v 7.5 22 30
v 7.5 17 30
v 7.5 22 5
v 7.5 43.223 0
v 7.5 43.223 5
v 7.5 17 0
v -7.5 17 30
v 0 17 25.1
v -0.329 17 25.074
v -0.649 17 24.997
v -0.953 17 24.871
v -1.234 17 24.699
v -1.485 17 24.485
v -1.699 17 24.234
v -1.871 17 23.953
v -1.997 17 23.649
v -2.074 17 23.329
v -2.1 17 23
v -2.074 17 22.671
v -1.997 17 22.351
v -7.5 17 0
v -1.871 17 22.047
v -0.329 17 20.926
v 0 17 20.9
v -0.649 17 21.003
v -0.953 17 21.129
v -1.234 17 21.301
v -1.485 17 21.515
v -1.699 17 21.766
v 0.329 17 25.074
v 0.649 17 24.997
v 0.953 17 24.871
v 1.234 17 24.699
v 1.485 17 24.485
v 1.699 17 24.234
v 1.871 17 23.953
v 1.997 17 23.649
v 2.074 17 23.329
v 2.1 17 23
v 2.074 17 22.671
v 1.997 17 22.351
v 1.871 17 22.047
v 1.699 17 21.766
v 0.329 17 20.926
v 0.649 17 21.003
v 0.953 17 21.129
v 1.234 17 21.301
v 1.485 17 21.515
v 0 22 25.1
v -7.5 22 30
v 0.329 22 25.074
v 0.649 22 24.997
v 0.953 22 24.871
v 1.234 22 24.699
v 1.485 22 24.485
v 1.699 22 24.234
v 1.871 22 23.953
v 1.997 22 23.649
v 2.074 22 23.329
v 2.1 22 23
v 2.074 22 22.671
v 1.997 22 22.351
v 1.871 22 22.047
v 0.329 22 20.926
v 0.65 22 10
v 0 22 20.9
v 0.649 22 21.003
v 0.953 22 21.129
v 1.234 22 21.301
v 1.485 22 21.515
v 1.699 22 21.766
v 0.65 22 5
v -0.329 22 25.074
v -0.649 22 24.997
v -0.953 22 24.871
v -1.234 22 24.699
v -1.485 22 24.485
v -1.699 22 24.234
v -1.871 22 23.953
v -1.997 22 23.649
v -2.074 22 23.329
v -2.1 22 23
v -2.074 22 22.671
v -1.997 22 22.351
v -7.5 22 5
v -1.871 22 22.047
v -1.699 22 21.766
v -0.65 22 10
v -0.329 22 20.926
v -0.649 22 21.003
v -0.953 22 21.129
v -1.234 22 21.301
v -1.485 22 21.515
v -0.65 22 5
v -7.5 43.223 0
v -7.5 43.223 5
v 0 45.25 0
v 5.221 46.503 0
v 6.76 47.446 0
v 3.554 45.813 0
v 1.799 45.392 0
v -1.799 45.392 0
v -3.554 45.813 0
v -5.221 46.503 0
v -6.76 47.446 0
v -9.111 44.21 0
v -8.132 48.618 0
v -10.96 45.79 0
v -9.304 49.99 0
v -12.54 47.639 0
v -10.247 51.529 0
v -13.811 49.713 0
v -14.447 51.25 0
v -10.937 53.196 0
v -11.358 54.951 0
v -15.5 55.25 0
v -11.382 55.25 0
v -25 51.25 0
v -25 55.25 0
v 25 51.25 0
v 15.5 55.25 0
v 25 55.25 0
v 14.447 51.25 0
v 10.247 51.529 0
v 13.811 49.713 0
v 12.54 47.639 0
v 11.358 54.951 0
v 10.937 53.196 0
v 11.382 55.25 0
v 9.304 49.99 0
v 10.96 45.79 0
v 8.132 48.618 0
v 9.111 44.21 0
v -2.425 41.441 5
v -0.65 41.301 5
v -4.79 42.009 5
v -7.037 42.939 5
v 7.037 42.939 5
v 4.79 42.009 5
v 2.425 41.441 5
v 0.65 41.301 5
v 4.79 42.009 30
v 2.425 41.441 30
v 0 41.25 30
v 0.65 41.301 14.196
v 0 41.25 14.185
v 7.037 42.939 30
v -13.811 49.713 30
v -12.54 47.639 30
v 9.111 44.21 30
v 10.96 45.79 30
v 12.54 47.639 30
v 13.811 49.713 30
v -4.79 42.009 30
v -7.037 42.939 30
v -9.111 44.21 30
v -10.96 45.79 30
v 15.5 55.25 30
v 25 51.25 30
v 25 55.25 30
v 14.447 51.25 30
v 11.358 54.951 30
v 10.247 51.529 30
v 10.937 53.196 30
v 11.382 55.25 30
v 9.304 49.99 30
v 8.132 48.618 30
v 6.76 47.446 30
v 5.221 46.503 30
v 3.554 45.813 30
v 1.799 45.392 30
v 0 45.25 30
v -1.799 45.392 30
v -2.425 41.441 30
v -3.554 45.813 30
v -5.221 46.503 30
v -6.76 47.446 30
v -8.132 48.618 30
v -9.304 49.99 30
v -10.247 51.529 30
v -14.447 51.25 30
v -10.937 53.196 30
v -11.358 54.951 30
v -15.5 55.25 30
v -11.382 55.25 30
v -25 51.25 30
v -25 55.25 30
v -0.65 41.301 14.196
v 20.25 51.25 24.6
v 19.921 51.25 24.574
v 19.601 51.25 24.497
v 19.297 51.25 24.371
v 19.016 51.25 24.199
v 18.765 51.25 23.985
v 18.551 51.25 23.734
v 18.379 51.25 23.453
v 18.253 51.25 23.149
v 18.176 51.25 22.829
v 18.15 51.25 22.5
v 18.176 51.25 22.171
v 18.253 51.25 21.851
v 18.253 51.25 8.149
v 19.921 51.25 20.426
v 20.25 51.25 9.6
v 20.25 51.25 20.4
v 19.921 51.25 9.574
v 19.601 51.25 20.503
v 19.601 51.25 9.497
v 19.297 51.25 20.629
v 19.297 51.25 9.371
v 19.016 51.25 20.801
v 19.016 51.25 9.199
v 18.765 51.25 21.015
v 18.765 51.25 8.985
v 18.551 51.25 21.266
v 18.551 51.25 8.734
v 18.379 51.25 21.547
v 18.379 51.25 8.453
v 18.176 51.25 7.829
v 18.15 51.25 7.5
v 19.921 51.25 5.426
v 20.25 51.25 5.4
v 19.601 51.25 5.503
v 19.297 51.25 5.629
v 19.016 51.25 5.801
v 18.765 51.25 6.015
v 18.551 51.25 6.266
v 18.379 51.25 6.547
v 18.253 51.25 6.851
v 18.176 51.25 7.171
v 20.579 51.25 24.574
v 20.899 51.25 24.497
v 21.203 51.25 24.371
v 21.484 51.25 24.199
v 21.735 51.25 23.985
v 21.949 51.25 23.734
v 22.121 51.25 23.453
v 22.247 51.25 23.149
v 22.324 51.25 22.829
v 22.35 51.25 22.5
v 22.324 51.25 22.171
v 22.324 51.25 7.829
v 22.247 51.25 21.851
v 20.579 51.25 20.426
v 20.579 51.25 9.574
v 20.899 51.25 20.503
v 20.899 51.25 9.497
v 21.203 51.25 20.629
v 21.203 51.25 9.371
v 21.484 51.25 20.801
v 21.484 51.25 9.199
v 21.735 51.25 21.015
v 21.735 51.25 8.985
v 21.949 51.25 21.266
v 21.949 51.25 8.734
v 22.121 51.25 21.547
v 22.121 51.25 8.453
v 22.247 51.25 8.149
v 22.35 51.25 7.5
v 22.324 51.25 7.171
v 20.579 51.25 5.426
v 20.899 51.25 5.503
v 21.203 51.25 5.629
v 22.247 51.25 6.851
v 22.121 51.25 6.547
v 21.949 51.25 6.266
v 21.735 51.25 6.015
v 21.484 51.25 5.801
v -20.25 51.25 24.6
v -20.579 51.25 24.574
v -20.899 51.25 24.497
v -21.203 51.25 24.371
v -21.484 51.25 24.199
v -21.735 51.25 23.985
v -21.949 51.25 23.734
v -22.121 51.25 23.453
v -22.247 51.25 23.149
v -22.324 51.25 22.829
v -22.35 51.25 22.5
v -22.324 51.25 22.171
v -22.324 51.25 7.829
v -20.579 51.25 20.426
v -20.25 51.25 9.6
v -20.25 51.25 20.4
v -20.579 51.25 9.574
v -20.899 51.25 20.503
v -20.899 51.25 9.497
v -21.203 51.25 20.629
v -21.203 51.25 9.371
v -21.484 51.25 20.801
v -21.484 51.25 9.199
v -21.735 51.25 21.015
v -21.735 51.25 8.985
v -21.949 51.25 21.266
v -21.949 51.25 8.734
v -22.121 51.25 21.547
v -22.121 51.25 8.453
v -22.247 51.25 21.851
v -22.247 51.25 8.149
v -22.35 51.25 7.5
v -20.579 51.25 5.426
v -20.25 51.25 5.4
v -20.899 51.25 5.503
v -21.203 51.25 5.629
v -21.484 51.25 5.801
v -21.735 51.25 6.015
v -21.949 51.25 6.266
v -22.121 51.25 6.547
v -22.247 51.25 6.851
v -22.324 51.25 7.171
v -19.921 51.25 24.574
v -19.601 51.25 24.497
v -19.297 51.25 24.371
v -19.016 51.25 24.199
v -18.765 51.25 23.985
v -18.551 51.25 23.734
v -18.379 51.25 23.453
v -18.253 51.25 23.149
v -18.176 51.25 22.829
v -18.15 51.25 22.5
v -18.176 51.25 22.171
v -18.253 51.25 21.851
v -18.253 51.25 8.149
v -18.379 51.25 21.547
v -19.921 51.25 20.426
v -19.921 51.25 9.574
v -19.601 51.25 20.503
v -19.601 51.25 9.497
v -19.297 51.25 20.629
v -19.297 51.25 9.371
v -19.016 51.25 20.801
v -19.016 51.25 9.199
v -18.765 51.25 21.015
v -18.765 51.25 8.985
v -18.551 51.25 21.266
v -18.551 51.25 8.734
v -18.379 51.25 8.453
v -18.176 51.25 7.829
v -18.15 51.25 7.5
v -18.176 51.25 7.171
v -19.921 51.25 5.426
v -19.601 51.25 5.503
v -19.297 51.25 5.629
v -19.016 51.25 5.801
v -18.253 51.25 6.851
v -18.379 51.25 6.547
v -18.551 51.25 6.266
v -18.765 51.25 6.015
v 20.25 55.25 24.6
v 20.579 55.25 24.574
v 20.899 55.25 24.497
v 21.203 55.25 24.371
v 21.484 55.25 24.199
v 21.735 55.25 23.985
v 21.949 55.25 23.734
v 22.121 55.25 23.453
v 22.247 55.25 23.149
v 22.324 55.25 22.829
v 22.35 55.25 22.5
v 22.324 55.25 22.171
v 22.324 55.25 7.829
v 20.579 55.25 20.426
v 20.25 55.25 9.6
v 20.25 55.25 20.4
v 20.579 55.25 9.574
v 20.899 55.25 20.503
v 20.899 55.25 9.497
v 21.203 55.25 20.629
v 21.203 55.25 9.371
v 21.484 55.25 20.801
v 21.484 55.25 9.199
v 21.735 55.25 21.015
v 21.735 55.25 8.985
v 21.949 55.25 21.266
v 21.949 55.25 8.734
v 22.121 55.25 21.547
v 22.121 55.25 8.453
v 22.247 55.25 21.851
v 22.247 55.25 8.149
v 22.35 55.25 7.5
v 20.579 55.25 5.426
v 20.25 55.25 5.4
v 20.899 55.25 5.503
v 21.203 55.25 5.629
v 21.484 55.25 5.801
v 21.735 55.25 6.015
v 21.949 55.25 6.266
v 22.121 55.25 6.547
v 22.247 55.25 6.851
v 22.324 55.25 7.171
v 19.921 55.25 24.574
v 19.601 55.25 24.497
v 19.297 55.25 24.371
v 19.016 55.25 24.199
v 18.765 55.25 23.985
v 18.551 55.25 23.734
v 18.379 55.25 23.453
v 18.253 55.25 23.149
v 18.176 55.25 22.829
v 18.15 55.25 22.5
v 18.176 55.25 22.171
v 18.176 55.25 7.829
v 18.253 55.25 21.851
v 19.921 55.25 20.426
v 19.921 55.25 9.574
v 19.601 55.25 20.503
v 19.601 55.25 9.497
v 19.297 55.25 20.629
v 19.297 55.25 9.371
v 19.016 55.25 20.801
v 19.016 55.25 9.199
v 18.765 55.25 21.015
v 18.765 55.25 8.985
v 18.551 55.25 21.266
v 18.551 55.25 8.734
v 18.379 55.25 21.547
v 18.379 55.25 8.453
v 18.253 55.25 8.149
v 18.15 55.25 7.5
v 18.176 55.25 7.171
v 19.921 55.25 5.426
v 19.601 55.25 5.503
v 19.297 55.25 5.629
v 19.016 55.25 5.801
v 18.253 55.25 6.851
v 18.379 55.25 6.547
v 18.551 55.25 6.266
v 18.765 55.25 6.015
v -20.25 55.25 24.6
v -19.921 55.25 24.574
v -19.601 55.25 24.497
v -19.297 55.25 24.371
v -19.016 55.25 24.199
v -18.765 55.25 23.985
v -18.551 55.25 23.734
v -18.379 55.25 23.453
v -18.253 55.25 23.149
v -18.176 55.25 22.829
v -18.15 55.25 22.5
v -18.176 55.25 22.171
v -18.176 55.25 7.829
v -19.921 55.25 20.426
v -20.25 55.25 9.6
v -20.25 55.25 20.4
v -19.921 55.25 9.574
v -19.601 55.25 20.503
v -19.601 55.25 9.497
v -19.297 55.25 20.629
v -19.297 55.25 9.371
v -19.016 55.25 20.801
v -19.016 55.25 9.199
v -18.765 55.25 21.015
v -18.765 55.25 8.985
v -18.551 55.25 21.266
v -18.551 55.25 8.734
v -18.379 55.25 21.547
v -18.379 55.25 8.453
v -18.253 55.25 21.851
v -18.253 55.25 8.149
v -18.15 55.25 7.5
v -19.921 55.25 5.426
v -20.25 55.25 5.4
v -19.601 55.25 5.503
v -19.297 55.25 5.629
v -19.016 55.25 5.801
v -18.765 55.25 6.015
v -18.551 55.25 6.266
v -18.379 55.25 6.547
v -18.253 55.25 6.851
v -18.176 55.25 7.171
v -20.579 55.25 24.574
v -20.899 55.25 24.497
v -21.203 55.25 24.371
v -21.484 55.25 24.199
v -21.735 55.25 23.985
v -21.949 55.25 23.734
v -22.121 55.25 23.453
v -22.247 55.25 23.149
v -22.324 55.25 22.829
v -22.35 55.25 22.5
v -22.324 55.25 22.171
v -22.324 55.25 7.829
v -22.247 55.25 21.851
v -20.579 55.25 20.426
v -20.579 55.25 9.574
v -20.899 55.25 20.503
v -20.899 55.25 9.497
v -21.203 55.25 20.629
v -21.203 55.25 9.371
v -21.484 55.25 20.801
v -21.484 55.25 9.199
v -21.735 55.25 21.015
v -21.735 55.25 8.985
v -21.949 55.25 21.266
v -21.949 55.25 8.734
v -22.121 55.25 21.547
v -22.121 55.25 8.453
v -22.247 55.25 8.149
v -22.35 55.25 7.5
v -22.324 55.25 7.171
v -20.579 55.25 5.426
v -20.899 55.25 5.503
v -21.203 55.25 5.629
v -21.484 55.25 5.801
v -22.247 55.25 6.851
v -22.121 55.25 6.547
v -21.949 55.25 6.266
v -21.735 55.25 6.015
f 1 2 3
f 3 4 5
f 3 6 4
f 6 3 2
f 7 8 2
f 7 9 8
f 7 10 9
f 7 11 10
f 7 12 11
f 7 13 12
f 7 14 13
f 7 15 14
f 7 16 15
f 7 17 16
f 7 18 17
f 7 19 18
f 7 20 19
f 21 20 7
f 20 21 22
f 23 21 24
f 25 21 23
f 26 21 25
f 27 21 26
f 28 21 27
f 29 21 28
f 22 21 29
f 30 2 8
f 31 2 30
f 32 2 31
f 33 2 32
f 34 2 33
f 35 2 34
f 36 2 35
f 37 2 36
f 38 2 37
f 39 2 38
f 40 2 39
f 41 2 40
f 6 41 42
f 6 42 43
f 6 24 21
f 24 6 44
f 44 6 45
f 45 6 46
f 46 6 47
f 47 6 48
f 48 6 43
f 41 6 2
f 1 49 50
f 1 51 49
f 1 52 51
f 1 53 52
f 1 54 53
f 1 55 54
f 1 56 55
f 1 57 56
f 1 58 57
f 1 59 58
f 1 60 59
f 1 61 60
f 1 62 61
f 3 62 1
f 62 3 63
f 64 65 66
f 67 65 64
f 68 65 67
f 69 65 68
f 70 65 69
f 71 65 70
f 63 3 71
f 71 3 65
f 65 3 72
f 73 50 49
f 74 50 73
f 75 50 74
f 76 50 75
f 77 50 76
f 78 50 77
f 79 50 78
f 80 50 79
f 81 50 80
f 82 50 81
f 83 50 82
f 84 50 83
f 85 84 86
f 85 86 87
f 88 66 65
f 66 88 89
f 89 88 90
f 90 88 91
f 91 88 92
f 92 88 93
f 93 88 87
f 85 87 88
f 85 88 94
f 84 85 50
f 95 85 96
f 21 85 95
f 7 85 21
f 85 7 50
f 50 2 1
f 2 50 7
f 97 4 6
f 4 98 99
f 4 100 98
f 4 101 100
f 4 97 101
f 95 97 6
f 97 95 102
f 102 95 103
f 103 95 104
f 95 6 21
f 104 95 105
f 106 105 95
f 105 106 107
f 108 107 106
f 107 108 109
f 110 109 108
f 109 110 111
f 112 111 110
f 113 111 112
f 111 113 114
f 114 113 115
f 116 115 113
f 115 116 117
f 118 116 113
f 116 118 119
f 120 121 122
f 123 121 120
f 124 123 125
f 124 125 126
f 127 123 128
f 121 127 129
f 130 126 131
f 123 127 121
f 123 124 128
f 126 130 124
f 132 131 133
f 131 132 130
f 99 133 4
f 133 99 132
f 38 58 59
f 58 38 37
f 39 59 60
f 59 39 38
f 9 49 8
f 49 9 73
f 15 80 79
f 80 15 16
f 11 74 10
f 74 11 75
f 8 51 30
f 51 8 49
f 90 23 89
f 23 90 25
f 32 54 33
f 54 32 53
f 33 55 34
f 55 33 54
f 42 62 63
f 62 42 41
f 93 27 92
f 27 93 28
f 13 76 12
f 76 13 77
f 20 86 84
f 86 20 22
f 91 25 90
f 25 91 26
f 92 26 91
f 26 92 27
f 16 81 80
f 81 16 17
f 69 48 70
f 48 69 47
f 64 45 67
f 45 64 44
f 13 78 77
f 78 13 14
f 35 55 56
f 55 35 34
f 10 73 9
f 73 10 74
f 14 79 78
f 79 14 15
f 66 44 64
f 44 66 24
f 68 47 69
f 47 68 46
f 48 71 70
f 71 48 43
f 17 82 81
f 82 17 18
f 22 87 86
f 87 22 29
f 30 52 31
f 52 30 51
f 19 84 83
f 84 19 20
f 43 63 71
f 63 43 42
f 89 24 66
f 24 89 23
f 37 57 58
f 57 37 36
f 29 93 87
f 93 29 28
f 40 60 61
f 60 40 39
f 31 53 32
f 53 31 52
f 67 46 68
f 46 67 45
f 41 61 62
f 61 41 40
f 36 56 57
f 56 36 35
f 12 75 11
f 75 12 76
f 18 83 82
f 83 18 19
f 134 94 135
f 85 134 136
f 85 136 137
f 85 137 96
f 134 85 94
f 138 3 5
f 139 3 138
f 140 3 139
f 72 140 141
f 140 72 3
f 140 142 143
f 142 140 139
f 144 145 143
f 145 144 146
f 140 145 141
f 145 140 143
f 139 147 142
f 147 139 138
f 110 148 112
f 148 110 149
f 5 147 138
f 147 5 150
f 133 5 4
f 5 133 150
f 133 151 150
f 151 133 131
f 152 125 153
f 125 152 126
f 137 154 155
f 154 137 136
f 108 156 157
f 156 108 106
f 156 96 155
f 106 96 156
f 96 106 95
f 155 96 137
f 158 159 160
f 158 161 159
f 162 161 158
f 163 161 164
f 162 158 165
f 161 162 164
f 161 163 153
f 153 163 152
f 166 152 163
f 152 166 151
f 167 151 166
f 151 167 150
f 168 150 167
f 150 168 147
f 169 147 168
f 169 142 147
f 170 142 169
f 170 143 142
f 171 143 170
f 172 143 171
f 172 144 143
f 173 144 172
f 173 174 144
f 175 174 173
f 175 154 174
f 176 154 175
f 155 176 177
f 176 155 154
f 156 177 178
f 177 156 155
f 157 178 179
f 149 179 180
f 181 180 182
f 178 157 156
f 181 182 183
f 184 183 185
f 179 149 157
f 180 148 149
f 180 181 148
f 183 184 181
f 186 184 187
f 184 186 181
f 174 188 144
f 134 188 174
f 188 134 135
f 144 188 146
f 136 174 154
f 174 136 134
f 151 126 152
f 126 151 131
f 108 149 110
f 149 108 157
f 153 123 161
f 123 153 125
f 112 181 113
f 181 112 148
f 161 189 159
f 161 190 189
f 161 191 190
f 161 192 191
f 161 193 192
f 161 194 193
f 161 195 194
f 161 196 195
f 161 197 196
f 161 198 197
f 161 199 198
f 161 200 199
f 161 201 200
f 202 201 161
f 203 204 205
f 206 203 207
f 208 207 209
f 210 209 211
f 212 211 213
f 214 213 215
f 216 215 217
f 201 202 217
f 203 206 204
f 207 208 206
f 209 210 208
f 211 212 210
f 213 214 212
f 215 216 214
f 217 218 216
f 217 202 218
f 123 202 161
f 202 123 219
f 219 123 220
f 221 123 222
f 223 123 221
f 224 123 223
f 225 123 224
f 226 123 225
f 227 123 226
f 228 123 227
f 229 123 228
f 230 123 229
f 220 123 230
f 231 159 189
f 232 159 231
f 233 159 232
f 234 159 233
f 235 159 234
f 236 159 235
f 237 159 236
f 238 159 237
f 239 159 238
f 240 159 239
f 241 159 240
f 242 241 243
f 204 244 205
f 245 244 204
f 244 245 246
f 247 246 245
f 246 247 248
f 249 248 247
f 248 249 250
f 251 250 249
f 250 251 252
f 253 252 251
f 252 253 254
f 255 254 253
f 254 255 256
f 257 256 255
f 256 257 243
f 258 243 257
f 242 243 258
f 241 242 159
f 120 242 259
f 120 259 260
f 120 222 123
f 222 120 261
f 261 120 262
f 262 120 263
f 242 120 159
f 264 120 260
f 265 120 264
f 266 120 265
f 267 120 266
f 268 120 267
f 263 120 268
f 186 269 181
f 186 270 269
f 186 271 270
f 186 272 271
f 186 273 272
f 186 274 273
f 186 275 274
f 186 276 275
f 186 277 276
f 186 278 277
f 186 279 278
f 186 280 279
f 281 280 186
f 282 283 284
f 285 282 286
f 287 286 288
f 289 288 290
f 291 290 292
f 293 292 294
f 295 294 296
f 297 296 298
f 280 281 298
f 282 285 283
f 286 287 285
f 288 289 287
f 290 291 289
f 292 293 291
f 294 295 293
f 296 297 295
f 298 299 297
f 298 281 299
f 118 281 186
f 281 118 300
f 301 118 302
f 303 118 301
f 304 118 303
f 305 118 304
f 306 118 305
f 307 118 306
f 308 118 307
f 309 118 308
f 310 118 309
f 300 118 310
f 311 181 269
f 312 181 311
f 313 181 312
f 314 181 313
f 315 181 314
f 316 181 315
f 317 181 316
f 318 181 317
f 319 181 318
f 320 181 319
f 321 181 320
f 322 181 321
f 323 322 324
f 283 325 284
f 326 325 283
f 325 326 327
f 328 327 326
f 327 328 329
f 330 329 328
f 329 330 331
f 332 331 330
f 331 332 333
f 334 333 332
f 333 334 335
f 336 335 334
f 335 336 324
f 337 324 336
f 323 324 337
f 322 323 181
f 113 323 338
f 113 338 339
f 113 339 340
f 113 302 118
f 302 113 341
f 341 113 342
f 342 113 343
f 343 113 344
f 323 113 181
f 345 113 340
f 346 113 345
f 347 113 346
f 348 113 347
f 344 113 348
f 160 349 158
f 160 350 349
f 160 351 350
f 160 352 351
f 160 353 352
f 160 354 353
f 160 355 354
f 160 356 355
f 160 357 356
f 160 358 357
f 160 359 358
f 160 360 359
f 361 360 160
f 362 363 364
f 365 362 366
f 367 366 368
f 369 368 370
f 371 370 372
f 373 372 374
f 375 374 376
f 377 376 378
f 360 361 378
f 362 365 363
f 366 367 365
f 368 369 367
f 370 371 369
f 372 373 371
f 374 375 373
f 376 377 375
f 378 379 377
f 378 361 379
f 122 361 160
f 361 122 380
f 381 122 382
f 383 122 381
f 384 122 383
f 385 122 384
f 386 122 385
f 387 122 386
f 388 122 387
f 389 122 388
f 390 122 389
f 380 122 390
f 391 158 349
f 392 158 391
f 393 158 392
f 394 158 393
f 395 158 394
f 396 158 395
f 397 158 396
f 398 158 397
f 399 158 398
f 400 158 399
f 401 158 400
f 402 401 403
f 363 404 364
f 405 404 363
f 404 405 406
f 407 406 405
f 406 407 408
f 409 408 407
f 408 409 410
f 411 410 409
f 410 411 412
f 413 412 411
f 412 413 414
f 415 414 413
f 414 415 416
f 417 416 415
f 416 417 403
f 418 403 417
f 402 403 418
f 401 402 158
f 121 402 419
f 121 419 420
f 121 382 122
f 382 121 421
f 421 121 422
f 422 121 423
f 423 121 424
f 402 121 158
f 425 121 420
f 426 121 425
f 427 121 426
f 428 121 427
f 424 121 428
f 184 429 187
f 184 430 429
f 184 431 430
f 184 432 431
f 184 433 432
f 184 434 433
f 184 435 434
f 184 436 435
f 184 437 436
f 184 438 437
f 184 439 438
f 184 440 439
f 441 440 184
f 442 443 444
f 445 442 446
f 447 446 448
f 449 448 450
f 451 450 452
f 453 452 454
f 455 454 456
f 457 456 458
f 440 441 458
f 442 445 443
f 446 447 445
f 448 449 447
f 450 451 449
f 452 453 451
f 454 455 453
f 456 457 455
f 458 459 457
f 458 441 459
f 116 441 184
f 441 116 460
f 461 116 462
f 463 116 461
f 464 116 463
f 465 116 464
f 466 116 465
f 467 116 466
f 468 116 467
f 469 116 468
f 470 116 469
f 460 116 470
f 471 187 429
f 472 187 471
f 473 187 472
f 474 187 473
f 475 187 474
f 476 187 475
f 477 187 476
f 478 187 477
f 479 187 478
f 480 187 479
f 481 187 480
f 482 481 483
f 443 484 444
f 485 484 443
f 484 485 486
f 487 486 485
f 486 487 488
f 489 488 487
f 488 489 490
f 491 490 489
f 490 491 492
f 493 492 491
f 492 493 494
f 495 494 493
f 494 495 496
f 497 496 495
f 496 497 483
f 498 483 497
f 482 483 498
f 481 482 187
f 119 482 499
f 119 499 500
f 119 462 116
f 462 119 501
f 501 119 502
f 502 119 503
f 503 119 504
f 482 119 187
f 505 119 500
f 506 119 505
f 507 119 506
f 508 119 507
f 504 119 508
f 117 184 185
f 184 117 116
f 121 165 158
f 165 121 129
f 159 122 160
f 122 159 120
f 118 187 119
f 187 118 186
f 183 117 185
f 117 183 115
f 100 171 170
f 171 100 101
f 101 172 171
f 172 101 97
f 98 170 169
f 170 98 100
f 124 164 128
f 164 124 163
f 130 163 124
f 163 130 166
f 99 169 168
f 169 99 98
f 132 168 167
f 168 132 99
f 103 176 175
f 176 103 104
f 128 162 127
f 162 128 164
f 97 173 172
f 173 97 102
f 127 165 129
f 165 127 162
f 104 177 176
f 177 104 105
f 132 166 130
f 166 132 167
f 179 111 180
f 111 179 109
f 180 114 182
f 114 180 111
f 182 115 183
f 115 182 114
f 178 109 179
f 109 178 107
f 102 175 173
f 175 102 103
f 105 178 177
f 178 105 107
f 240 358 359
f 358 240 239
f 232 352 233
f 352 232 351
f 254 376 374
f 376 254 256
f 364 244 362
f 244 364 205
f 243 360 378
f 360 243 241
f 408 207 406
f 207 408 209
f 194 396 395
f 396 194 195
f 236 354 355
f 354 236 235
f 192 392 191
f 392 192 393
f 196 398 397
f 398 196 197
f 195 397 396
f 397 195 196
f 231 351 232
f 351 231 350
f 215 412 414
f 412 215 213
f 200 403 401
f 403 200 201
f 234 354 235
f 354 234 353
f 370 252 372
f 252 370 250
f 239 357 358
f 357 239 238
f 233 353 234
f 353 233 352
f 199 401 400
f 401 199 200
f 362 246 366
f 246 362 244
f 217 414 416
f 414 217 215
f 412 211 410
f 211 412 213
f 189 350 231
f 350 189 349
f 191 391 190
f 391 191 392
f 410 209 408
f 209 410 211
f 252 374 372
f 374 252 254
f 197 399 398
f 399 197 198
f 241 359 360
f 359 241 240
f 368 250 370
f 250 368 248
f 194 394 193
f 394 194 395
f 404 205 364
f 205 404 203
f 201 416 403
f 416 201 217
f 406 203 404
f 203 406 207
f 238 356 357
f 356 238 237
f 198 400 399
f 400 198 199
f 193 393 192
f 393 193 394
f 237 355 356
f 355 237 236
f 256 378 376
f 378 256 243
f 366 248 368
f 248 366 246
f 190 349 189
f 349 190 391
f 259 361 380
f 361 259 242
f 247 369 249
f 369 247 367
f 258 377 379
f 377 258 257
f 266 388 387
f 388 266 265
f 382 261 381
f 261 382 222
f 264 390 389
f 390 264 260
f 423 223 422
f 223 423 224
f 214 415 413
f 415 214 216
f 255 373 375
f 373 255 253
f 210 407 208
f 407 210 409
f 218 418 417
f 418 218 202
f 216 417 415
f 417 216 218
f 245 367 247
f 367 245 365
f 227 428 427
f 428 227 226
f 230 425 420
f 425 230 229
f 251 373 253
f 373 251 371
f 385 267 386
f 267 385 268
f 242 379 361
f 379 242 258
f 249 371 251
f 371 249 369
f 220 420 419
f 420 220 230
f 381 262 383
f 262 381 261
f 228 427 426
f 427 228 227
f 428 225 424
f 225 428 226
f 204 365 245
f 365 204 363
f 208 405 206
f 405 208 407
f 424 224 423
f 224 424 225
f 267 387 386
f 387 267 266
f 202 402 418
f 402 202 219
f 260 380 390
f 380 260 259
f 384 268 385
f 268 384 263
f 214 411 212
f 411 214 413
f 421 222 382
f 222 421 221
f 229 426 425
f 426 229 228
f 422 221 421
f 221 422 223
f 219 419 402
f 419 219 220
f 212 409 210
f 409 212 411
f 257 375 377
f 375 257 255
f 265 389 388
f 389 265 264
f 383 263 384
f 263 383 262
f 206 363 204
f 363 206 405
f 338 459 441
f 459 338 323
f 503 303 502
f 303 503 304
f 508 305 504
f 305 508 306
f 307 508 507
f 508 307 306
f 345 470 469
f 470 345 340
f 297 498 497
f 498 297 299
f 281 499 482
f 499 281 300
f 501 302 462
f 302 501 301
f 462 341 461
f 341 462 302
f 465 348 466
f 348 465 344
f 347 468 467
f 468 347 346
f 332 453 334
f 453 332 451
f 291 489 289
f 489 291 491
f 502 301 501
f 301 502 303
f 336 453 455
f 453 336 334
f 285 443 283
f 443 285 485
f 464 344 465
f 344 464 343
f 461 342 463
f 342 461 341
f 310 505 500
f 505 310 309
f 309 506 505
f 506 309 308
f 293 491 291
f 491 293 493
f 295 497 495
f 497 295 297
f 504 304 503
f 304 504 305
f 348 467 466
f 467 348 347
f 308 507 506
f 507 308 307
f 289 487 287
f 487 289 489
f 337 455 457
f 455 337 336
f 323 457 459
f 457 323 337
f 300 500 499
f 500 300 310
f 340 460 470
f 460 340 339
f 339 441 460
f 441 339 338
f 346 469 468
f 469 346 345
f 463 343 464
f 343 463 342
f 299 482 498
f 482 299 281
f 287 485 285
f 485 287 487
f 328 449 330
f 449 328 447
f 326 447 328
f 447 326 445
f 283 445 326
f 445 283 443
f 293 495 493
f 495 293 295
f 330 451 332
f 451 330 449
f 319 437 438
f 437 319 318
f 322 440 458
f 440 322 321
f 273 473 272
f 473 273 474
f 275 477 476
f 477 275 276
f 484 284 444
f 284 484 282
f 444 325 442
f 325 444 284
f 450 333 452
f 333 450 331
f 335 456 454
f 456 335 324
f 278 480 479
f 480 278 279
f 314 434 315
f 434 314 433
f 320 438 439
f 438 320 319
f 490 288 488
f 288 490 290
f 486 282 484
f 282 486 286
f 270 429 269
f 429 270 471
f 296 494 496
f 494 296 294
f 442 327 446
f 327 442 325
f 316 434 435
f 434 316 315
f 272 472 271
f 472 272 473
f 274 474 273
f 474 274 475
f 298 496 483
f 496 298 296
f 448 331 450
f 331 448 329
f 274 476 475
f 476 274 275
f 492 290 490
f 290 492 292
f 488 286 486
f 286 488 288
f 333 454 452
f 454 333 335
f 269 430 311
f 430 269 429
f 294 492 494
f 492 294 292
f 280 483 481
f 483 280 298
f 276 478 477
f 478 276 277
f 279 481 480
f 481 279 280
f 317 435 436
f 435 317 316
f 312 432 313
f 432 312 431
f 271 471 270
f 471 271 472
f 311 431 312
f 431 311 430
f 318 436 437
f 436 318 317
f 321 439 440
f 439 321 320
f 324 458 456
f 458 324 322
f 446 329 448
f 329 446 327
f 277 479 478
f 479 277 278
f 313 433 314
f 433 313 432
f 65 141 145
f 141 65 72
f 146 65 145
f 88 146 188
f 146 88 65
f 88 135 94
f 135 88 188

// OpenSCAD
// file: ISLHOLDER01A_D04.scad
$fn=40; // model faces resolution.
include <../configuration2.scad>


//Drzak na sloup - cast bez drzaku anemometru
module ISLHOLDER01A_D04(){
	
difference()
    {
    union()
        {
        //základní válec
        cylinder(h=D02_vyska_uchytky,r=(D02_prumer_obruby+2*D02_sila_materialu)/2,center=true);
		//úchytové plošky		
        translate([D02_dotahova_vzdalenost+D02_sila_materialu/2,0,0]){cube([D02_sila_materialu,D02_delka_celeho_uchytu,D02_vyska_uchytky],center=true);}
		}
    
    //válec na odečet
    cylinder(h=D02_vyska_uchytky+0.01,r=D02_prumer_obruby/2,center=true);     
	        
    //kvádr na odecet
	translate([D02_dotahova_vzdalenost-(D02_prumer_obruby+2*D02_sila_materialu)/2,0,0]){cube([D02_prumer_obruby+2*D02_sila_materialu,D02_prumer_obruby+2*D02_sila_materialu,D02_vyska_uchytky+0.01],center=true);}
		
	//otvory na sroub
	translate([D02_dotahova_vzdalenost,(D02_delka_celeho_uchytu/2-D02_prumer_obruby/2-D02_sila_materialu)/2+D02_prumer_obruby/2+D02_sila_materialu,D02_vyska_uchytky/4]){rotate([0,90,0]){cylinder(h=D02_sila_materialu+0.01,r=D02_prumer_uchytneho_sroubu/2);}}
    
     //drzak matky
    translate([D02_dotahova_vzdalenost+D02_sila_materialu-D02_vyska_matky,(D02_delka_celeho_uchytu/2-D02_prumer_obruby/2-D02_sila_materialu)/2+D02_prumer_obruby/2+D02_sila_materialu,D02_vyska_uchytky/4]){rotate([0,90,0]){ cylinder (h = D02_vyska_matky+0.01, r= (D02_sirka_matky+0.2)/2, $fn=6);}}
   
     
        
    translate([D02_dotahova_vzdalenost,(D02_delka_celeho_uchytu/2-D02_prumer_obruby/2-D02_sila_materialu)/2+D02_prumer_obruby/2+D02_sila_materialu,-D02_vyska_uchytky/4]){rotate([0,90,0]){cylinder(h=D02_sila_materialu+0.01,r=D02_prumer_uchytneho_sroubu/2);}}
    
     //drzak matky
    translate([D02_dotahova_vzdalenost+D02_sila_materialu-D02_vyska_matky,(D02_delka_celeho_uchytu/2-D02_prumer_obruby/2-D02_sila_materialu)/2+D02_prumer_obruby/2+D02_sila_materialu,-D02_vyska_uchytky/4]){rotate([0,90,0]){ cylinder (h = D02_vyska_matky+0.01, r= (D02_sirka_matky+0.2)/2, $fn=6);}}
        
	translate([D02_dotahova_vzdalenost,-((D02_delka_celeho_uchytu/2-D02_prumer_obruby/2-D02_sila_materialu)/2+D02_prumer_obruby/2+D02_sila_materialu),-D02_vyska_uchytky/4]){rotate([0,90,0]){cylinder(h=D02_sila_materialu+0.01,r=D02_prumer_uchytneho_sroubu/2);}}
    
     //drzak matky
    translate([D02_dotahova_vzdalenost+D02_sila_materialu-D02_vyska_matky,-((D02_delka_celeho_uchytu/2-D02_prumer_obruby/2-D02_sila_materialu)/2+D02_prumer_obruby/2+D02_sila_materialu),-D02_vyska_uchytky/4]){rotate([0,90,0]){ cylinder (h = D02_vyska_matky+0.01, r= (D02_sirka_matky+0.2)/2, $fn=6);}}

    translate([D02_dotahova_vzdalenost,-((D02_delka_celeho_uchytu/2-D02_prumer_obruby/2-D02_sila_materialu)/2+D02_prumer_obruby/2+D02_sila_materialu),D02_vyska_uchytky/4]){rotate([0,90,0]){cylinder(h=D02_sila_materialu+0.01,r=D02_prumer_uchytneho_sroubu/2);}}	
    
     //drzak matky
    translate([D02_dotahova_vzdalenost+D02_sila_materialu-D02_vyska_matky,-((D02_delka_celeho_uchytu/2-D02_prumer_obruby/2-D02_sila_materialu)/2+D02_prumer_obruby/2+D02_sila_materialu),D02_vyska_uchytky/4]){rotate([0,90,0]){ cylinder (h = D02_vyska_matky+0.01, r= (D02_sirka_matky+0.2)/2, $fn=6);}}
	
    }
}

module ISLHOLDER01A_D04_2(){
	
difference()
    {
    union()
        {
        //základní válec
        cylinder(h=D02_vyska_uchytky,r=(D02_prumer_obruby+2*D02_sila_materialu)/2,center=true);
		//úchytové plošky		
        translate([D02_dotahova_vzdalenost+D02_sila_materialu/2,0,0]){cube([D02_sila_materialu,D02_delka_celeho_uchytu,D02_vyska_uchytky],center=true);}
		}
    
    //válec na odečet
    cylinder(h=D02_vyska_uchytky+0.01,r=D02_prumer_obruby/2,center=true);     
	        
    //kvádr na odecet
	translate([D02_dotahova_vzdalenost-(D02_prumer_obruby+2*D02_sila_materialu)/2,0,0]){cube([D02_prumer_obruby+2*D02_sila_materialu,D02_prumer_obruby+2*D02_sila_materialu,D02_vyska_uchytky+0.01],center=true);}
		
	//otvory na sroub
	translate([D02_dotahova_vzdalenost,(D02_delka_celeho_uchytu/2-D02_prumer_obruby/2-D02_sila_materialu)/2+D02_prumer_obruby/2+D02_sila_materialu,D02_vyska_uchytky/4]){rotate([0,90,0]){cylinder(h=D02_sila_materialu+0.01,r=D02_prumer_uchytneho_sroubu/2);}}
    
    
   
     
        
    translate([D02_dotahova_vzdalenost,(D02_delka_celeho_uchytu/2-D02_prumer_obruby/2-D02_sila_materialu)/2+D02_prumer_obruby/2+D02_sila_materialu,-D02_vyska_uchytky/4]){rotate([0,90,0]){cylinder(h=D02_sila_materialu+0.01,r=D02_prumer_uchytneho_sroubu/2);}}
    
     
        
	translate([D02_dotahova_vzdalenost,-((D02_delka_celeho_uchytu/2-D02_prumer_obruby/2-D02_sila_materialu)/2+D02_prumer_obruby/2+D02_sila_materialu),-D02_vyska_uchytky/4]){rotate([0,90,0]){cylinder(h=D02_sila_materialu+0.01,r=D02_prumer_uchytneho_sroubu/2);}}
    
    

    translate([D02_dotahova_vzdalenost,-((D02_delka_celeho_uchytu/2-D02_prumer_obruby/2-D02_sila_materialu)/2+D02_prumer_obruby/2+D02_sila_materialu),D02_vyska_uchytky/4]){rotate([0,90,0]){cylinder(h=D02_sila_materialu+0.01,r=D02_prumer_uchytneho_sroubu/2);}}	
    
    
	
    }
}


//ISLHOLDER01A_D02();
// file: ../configuration2.scad
$fn=40; // model faces resolution.

//Parametry pro D03 a D04
//Nastavení držáku zkumavky
//----------------------------------------------------------------
//----------------------------------------------------------------
//není potřeba měnit
S01_prumer_vnitrni=40;
S01_tolerance_zavit=1.5;

S01_sila_materialu=1.3; //sila výtuhy

//D03 - uchyt velky
D01_material_pod_zavitem=5;
D01_material_za_zavitem=3;
D01_material_pred_zavitem=2;
D01_delka_tyce=20;
D01_sirka_tyce=15;

//D04 - uchyt na sloup
D02_sila_materialu=4;
D02_vyska_uchytky=30;
D02_prumer_obruby=23; //pruměr zkumavky
D02_delka_celeho_uchytu=50;
D02_dotahova_vzdalenost=1.5;
D02_prumer_uchytneho_sroubu=4.2;
D02_sirka_matky=9.1; //pro M4
D02_vyska_matky=3;
// main file
$fn=40; // model faces resolution.
include <../configuration2.scad>

include <ISLHOLDER01A_D04.scad>


PI=3.141592;

//Držák anemometru

module ISLHOLDER01A_D03()
{
difference()
    {
    union()  
        { 
        //výstuha
            translate([S01_sila_materialu/2,0,0])
        rotate ([0,-90,0])
            linear_extrude (height = S01_sila_materialu, convexity = 10)
                polygon(points=[[D02_vyska_uchytky/2,D01_delka_tyce+S01_prumer_vnitrni/2+D01_material_pred_zavitem+D02_sila_materialu-1],[0, D01_delka_tyce+S01_prumer_vnitrni/2+D01_material_pred_zavitem+D02_sila_materialu-1],[0,S01_prumer_vnitrni/2+D01_material_pred_zavitem],[D02_vyska_uchytky/3,S01_prumer_vnitrni/2+D01_material_pred_zavitem]]);   
  
         rotate ([90,0,0])     
translate([0,15,D01_material_pod_zavitem/2-S01_prumer_vnitrni/2-D01_material_pred_zavitem])
         difference() {   
  cube([D01_sirka_tyce,30,D01_material_pod_zavitem],center=true); 
translate([0,8,0])
cylinder(h=D01_material_pod_zavitem+0.01,r=D02_prumer_uchytneho_sroubu/2,center=true); 
}

        //uchyt na tyc
        translate([0,D01_delka_tyce/2+(S01_prumer_vnitrni-S01_tolerance_zavit)/2+D01_material_pred_zavitem,D01_material_pod_zavitem/2])
            cube([D01_sirka_tyce,D01_delka_tyce,D01_material_pod_zavitem],center=true); 
  
        //uchyt na tyc ovalna cast
        translate([0,(S01_prumer_vnitrni-S01_tolerance_zavit)/2+D01_material_pred_zavitem,D01_material_pod_zavitem/2])
            cube([D01_sirka_tyce,D01_material_za_zavitem+D01_material_pred_zavitem,D01_material_pod_zavitem],center=true);
      
        //material kolem uchytu na sloupek
        translate([0,D01_delka_tyce+(S01_prumer_vnitrni-S01_tolerance_zavit)/2+D01_material_pred_zavitem+(D02_sila_materialu+D02_prumer_obruby/2)/2-D02_dotahova_vzdalenost,D01_material_pod_zavitem/2])

        difference()
            {
            cube([D01_sirka_tyce,D02_sila_materialu+D02_prumer_obruby/2,D01_material_pod_zavitem],center=true);
            
            translate([0,D02_prumer_obruby/2-D02_dotahova_vzdalenost-D02_sila_materialu,0])    
                cylinder(h=D02_vyska_uchytky+0.01,r=D02_prumer_obruby/2,center=true);         
            }        
      
        //uchyt na sloupek
        translate([0,D01_delka_tyce+(S01_prumer_vnitrni-S01_tolerance_zavit)/2+D01_material_pred_zavitem+D02_sila_materialu+(D02_prumer_obruby)/2,D02_vyska_uchytky/2])
            rotate(a=[0,0,270])
                ISLHOLDER01A_D04_2();      

        }

    

    }
}
 
ISLHOLDER01A_D03();
 
